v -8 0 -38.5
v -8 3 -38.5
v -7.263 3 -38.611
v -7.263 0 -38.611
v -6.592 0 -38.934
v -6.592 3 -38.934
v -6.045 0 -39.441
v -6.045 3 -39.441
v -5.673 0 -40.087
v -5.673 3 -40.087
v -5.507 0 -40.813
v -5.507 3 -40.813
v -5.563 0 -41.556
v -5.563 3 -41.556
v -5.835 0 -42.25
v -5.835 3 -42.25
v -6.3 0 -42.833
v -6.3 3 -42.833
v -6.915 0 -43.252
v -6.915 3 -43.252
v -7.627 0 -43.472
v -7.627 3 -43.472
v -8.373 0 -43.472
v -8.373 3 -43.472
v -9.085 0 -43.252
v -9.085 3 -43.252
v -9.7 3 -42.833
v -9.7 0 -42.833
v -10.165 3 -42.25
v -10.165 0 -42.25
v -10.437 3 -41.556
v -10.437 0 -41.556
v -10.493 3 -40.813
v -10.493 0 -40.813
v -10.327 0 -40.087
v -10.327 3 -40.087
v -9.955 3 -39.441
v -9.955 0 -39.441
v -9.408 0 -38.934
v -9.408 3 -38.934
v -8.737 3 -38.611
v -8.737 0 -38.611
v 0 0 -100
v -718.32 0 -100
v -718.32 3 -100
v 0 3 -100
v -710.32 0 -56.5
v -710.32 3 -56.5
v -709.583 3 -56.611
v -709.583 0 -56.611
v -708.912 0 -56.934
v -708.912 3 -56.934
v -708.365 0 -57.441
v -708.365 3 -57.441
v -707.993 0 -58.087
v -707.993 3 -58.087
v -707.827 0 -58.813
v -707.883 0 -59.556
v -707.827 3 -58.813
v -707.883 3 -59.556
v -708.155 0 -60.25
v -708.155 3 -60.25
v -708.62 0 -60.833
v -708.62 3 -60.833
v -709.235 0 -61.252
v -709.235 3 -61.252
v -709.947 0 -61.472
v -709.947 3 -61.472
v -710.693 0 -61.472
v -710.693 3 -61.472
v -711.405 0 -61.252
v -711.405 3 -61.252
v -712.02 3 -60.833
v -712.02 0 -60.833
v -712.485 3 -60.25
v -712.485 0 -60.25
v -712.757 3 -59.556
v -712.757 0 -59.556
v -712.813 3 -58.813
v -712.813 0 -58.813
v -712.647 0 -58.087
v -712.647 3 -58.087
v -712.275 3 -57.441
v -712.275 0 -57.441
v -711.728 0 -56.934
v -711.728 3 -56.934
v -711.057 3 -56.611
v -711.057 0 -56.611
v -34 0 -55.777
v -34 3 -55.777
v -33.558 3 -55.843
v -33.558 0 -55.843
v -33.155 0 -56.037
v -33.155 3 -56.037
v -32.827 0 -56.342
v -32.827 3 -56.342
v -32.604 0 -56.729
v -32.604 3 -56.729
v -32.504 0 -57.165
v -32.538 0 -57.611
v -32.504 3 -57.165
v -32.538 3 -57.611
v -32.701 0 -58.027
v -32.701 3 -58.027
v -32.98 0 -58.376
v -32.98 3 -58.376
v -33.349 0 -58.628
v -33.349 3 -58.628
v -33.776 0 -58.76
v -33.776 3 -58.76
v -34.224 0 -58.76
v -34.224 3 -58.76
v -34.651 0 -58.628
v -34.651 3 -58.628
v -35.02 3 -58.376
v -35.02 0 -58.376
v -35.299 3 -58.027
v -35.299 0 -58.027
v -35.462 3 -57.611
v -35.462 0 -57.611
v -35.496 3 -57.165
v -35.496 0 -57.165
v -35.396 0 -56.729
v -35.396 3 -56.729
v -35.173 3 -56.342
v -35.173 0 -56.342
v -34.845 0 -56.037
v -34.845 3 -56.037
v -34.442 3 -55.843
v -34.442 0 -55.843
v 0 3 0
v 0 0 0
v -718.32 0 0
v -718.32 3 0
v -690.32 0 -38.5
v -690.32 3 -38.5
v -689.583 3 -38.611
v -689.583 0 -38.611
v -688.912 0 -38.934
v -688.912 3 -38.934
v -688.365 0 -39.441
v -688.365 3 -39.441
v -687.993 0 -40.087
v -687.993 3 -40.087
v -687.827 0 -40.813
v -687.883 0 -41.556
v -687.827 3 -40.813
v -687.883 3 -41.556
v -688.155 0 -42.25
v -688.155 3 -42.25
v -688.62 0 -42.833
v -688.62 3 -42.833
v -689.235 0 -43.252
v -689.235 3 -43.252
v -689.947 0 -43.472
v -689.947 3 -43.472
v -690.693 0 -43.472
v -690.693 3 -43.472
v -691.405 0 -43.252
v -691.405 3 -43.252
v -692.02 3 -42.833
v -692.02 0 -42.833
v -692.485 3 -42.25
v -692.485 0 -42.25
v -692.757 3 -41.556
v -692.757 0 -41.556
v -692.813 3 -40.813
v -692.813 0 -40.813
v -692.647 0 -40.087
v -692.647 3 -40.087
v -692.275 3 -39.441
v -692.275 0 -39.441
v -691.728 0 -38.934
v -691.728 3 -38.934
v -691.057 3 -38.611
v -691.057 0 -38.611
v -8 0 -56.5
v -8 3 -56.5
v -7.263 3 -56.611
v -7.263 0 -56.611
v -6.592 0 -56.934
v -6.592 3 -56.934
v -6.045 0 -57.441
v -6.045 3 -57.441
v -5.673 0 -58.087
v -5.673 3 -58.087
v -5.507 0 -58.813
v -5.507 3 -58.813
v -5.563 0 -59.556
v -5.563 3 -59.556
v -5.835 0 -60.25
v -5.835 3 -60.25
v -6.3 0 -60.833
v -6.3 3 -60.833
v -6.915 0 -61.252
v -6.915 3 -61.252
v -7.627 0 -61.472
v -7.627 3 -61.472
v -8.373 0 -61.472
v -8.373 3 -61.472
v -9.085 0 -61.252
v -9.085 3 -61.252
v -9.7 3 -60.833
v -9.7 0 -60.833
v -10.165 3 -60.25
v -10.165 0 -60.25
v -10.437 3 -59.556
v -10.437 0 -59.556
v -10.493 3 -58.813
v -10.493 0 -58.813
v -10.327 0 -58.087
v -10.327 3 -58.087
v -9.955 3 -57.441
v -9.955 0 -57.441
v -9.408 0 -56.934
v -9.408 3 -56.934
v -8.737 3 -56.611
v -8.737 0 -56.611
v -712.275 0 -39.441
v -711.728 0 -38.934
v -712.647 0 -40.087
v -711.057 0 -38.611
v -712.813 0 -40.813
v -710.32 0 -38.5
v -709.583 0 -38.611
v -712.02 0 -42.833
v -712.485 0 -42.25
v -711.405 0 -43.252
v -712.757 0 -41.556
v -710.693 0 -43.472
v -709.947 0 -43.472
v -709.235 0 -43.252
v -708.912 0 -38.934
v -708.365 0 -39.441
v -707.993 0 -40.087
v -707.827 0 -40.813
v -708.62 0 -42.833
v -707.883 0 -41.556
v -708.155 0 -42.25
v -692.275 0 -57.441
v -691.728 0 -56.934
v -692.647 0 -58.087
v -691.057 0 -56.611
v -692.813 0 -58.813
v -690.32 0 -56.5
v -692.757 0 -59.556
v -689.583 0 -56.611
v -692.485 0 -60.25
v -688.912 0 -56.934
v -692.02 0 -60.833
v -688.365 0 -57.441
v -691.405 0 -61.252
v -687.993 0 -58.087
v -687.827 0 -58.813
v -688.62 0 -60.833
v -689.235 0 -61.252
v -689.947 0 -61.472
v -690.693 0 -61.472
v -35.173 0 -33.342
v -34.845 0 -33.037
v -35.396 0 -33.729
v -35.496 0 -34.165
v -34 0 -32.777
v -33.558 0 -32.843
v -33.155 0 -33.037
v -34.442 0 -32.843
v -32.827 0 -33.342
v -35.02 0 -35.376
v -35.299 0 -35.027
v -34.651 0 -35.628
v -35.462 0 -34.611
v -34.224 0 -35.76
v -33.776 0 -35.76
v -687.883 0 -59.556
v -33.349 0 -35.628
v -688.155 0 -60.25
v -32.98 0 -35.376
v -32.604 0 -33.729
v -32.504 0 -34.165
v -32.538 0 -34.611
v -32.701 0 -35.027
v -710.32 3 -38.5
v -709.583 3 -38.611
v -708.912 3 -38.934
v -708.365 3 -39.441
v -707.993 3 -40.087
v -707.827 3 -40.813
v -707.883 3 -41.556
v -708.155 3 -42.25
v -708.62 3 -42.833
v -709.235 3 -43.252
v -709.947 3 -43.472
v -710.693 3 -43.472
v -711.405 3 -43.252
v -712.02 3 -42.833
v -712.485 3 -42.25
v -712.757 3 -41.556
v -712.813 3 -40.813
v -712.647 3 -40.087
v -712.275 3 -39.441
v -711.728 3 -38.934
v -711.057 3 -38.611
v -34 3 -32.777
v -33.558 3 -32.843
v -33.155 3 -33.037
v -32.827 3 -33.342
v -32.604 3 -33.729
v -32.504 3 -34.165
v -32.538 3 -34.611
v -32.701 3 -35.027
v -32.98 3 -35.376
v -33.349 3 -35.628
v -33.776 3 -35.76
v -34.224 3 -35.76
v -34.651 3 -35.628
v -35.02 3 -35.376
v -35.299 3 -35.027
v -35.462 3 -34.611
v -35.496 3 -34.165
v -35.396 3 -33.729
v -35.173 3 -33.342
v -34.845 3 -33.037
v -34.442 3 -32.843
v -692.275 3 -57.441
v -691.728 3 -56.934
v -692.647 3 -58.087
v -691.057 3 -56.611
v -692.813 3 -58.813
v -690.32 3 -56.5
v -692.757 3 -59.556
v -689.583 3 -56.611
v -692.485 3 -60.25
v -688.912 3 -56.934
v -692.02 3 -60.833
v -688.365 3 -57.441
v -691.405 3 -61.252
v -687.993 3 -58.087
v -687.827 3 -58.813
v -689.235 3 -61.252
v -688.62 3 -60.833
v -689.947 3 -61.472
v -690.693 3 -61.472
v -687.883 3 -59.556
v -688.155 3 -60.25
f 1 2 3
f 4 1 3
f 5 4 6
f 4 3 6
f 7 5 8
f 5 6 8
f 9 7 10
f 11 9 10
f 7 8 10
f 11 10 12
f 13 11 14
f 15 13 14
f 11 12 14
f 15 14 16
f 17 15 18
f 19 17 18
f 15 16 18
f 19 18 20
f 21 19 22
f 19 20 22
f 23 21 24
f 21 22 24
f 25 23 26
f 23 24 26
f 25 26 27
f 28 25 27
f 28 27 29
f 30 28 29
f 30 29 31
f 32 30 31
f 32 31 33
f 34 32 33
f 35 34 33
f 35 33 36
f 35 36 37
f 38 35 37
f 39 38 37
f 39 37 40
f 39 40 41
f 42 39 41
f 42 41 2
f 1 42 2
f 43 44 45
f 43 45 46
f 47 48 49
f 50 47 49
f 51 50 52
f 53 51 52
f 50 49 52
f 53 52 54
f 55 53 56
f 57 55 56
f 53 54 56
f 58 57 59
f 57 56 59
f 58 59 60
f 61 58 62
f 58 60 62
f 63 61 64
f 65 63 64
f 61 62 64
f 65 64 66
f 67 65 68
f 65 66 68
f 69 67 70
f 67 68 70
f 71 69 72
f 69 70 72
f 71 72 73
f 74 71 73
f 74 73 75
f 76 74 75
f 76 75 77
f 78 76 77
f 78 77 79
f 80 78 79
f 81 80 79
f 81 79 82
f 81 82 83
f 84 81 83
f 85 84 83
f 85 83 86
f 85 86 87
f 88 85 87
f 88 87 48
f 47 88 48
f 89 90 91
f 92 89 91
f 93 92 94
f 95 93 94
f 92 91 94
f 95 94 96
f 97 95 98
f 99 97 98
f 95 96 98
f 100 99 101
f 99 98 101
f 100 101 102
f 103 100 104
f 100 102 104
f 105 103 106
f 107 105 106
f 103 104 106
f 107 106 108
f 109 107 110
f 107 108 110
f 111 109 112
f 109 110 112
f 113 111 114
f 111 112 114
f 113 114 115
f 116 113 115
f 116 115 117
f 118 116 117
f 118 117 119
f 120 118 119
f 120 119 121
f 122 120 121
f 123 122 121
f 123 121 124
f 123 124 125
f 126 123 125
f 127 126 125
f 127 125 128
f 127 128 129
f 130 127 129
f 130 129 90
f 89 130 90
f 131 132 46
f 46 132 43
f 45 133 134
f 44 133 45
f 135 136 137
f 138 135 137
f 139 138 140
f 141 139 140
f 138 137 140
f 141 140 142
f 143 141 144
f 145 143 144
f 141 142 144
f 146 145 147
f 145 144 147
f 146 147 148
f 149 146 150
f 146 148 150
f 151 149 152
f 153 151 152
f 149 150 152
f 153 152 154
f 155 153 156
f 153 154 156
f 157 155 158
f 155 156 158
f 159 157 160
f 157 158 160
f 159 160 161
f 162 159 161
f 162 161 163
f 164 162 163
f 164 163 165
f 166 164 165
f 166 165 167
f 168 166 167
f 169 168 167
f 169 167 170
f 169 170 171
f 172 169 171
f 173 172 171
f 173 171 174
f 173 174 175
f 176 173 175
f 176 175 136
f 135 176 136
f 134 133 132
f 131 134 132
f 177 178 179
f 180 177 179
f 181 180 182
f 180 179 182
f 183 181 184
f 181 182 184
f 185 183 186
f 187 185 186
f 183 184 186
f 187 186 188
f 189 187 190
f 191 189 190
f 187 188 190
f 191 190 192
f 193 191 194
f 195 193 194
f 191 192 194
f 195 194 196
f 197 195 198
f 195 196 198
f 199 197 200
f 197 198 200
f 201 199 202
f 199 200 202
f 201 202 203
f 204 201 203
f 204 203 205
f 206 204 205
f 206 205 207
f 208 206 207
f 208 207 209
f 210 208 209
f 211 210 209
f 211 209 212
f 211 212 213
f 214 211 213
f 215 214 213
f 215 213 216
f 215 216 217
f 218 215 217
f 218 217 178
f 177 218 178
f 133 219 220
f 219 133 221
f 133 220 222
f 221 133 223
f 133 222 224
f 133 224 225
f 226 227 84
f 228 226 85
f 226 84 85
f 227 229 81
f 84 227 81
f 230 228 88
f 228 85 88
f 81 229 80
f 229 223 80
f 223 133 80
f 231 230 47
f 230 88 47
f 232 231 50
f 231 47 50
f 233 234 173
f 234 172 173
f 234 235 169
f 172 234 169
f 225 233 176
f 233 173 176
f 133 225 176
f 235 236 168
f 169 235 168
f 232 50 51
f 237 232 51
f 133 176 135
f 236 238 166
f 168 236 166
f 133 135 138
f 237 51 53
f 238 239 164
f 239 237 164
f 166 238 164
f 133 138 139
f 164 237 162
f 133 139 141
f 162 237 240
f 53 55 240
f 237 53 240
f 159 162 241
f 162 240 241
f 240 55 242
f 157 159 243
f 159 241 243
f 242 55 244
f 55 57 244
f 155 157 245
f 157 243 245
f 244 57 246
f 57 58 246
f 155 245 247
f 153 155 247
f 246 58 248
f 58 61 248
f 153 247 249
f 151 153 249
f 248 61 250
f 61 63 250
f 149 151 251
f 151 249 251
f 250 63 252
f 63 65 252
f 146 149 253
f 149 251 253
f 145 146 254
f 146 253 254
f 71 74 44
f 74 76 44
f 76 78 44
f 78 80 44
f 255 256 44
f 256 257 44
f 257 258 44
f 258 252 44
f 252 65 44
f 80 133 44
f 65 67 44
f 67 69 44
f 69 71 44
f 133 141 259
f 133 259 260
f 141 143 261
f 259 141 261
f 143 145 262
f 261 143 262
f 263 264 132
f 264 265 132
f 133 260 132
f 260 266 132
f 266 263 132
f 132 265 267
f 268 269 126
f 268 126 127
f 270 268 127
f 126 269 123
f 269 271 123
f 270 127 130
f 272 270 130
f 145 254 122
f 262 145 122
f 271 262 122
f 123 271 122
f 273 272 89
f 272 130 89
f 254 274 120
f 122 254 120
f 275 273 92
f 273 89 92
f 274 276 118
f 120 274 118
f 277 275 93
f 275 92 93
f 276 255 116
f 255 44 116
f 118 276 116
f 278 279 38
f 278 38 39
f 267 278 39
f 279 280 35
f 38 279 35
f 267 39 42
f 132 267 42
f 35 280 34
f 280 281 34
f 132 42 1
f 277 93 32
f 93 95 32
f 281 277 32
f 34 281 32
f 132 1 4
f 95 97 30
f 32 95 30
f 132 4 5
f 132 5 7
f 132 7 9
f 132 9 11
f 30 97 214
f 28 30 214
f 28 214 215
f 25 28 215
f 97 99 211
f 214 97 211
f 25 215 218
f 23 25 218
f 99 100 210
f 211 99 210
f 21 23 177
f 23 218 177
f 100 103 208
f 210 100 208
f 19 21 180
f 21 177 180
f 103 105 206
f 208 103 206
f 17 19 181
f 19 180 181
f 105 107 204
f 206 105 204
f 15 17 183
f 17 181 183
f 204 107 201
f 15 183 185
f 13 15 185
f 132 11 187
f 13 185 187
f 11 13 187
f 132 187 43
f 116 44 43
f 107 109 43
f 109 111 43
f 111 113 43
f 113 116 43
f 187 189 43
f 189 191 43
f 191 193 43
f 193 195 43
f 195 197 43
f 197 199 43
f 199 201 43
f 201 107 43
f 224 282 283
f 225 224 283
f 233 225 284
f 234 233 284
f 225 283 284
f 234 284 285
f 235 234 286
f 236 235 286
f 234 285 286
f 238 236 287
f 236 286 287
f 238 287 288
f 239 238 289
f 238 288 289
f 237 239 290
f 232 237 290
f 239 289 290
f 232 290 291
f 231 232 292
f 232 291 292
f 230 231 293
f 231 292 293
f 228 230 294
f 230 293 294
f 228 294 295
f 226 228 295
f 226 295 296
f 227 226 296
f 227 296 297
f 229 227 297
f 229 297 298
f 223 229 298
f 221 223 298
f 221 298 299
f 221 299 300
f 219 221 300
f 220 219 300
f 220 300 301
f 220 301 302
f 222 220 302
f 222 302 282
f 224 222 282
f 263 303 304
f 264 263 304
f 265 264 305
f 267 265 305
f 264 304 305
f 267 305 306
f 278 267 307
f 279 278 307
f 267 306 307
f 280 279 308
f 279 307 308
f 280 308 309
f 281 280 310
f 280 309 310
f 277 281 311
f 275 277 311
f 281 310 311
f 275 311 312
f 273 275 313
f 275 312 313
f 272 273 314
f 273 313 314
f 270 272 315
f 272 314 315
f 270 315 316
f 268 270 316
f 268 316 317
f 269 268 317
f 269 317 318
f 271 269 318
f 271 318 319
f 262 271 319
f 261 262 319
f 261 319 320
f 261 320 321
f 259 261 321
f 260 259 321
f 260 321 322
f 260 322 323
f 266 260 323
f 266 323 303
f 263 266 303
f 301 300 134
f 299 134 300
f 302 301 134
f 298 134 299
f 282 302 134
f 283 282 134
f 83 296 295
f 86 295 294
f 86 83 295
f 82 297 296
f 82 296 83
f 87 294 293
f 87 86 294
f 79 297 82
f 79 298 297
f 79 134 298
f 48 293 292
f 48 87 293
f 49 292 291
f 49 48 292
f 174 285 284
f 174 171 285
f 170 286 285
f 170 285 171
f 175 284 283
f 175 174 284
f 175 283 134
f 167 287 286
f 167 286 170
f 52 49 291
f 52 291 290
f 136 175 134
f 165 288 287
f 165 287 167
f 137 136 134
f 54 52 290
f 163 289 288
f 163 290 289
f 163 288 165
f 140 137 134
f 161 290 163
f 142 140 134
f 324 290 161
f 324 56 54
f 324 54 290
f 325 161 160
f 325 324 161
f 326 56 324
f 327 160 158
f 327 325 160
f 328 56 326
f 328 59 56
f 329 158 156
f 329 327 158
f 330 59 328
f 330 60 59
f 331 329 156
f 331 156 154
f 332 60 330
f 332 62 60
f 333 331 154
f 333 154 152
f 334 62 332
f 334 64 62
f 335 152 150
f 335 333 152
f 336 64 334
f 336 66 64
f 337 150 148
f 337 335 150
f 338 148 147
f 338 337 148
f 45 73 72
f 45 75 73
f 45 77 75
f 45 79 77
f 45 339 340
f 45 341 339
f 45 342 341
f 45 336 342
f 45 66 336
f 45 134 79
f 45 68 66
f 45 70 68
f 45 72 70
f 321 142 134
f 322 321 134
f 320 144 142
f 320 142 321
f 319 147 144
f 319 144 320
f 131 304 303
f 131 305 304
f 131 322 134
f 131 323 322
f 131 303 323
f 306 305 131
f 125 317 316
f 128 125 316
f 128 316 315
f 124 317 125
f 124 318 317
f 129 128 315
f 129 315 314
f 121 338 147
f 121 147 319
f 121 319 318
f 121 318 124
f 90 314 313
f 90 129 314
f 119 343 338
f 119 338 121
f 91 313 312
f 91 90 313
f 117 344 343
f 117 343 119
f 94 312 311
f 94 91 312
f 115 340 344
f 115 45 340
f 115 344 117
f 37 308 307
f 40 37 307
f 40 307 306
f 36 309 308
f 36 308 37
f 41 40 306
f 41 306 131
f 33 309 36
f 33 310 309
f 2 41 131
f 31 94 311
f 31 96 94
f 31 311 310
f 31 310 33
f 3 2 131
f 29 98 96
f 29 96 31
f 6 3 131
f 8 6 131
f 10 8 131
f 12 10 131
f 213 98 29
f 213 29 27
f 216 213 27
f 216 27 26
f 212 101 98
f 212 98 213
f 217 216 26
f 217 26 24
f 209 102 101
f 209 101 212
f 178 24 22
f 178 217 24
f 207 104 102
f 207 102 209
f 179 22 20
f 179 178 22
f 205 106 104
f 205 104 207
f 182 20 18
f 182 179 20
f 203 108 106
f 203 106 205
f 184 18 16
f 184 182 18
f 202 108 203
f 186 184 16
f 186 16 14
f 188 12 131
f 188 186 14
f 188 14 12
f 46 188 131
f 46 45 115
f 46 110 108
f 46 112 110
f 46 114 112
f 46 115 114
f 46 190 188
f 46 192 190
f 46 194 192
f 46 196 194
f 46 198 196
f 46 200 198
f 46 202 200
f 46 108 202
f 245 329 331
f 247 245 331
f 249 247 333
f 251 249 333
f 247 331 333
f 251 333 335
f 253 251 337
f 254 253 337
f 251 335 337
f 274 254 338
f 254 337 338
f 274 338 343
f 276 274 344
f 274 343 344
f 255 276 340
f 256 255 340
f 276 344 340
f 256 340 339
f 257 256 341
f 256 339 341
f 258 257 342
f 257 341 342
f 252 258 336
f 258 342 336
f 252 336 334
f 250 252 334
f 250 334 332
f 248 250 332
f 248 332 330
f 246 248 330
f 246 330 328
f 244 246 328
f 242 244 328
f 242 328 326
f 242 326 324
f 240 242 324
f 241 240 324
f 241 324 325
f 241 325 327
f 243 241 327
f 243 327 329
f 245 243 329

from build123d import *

# Parameters (mm, degrees)
SKETCH1_W           = 718.32
SKETCH1_H           = 100
BOSS_EXTRUDE1_DEPTH = 3
SKETCH2_R           = 2.5
CUT_EXTRUDE1_DEPTH  = 30
SKETCH3_R           = 2.5
CUT_EXTRUDE2_DEPTH  = 30
SKETCH4_R           = 1.5
CUT_EXTRUDE3_DEPTH  = 10


with BuildPart() as part:
    # Sketch1 → Boss-Extrude1 (new body)
    with BuildSketch(Plane(origin=(0, 0, 0), x_dir=(1, 0, 0), z_dir=(0, 1, 0))):
        with Locations((-359.16, 50)):
            Rectangle(SKETCH1_W, SKETCH1_H)
    extrude(amount=BOSS_EXTRUDE1_DEPTH)

    # Sketch2 → Cut-Extrude1 (cut)
    with BuildSketch(Plane(origin=(0, 3, 0), x_dir=(1, 0, 0), z_dir=(0, 1, 0))):
        with Locations(Location((-710.32, 59, 0), (0, 0, 270))):
            Circle(SKETCH2_R)
        with Locations(Location((-8, 59, 0), (0, 0, 270))):
            Circle(SKETCH2_R)
        with Locations(Location((-8, 41, 0), (0, 0, 270))):
            Circle(SKETCH2_R)
        with Locations(Location((-710.32, 41, 0), (0, 0, 270))):
            Circle(SKETCH2_R)
    extrude(amount=-CUT_EXTRUDE1_DEPTH, mode=Mode.SUBTRACT)

    # Sketch3 → Cut-Extrude2 (cut)
    with BuildSketch(Plane(origin=(0, 3, 0), x_dir=(1, 0, 0), z_dir=(0, 1, 0))):
        with Locations(Location((-690.32, 59, 0), (0, 0, 270))):
            Circle(SKETCH3_R)
        with Locations(Location((-690.32, 41, 0), (0, 0, 270))):
            Circle(SKETCH3_R)
    extrude(amount=-CUT_EXTRUDE2_DEPTH, mode=Mode.SUBTRACT)

    # Sketch4 → Cut-Extrude3 (cut)
    with BuildSketch(Plane(origin=(0, 3, 0), x_dir=(1, 0, 0), z_dir=(0, 1, 0))):
        with Locations(Location((-34, 57.27680918, 0), (0, 0, 270))):
            Circle(SKETCH4_R)
        with Locations(Location((-34, 34.27680918, 0), (0, 0, 270))):
            Circle(SKETCH4_R)
    extrude(amount=-CUT_EXTRUDE3_DEPTH, mode=Mode.SUBTRACT)


solid = part.part
